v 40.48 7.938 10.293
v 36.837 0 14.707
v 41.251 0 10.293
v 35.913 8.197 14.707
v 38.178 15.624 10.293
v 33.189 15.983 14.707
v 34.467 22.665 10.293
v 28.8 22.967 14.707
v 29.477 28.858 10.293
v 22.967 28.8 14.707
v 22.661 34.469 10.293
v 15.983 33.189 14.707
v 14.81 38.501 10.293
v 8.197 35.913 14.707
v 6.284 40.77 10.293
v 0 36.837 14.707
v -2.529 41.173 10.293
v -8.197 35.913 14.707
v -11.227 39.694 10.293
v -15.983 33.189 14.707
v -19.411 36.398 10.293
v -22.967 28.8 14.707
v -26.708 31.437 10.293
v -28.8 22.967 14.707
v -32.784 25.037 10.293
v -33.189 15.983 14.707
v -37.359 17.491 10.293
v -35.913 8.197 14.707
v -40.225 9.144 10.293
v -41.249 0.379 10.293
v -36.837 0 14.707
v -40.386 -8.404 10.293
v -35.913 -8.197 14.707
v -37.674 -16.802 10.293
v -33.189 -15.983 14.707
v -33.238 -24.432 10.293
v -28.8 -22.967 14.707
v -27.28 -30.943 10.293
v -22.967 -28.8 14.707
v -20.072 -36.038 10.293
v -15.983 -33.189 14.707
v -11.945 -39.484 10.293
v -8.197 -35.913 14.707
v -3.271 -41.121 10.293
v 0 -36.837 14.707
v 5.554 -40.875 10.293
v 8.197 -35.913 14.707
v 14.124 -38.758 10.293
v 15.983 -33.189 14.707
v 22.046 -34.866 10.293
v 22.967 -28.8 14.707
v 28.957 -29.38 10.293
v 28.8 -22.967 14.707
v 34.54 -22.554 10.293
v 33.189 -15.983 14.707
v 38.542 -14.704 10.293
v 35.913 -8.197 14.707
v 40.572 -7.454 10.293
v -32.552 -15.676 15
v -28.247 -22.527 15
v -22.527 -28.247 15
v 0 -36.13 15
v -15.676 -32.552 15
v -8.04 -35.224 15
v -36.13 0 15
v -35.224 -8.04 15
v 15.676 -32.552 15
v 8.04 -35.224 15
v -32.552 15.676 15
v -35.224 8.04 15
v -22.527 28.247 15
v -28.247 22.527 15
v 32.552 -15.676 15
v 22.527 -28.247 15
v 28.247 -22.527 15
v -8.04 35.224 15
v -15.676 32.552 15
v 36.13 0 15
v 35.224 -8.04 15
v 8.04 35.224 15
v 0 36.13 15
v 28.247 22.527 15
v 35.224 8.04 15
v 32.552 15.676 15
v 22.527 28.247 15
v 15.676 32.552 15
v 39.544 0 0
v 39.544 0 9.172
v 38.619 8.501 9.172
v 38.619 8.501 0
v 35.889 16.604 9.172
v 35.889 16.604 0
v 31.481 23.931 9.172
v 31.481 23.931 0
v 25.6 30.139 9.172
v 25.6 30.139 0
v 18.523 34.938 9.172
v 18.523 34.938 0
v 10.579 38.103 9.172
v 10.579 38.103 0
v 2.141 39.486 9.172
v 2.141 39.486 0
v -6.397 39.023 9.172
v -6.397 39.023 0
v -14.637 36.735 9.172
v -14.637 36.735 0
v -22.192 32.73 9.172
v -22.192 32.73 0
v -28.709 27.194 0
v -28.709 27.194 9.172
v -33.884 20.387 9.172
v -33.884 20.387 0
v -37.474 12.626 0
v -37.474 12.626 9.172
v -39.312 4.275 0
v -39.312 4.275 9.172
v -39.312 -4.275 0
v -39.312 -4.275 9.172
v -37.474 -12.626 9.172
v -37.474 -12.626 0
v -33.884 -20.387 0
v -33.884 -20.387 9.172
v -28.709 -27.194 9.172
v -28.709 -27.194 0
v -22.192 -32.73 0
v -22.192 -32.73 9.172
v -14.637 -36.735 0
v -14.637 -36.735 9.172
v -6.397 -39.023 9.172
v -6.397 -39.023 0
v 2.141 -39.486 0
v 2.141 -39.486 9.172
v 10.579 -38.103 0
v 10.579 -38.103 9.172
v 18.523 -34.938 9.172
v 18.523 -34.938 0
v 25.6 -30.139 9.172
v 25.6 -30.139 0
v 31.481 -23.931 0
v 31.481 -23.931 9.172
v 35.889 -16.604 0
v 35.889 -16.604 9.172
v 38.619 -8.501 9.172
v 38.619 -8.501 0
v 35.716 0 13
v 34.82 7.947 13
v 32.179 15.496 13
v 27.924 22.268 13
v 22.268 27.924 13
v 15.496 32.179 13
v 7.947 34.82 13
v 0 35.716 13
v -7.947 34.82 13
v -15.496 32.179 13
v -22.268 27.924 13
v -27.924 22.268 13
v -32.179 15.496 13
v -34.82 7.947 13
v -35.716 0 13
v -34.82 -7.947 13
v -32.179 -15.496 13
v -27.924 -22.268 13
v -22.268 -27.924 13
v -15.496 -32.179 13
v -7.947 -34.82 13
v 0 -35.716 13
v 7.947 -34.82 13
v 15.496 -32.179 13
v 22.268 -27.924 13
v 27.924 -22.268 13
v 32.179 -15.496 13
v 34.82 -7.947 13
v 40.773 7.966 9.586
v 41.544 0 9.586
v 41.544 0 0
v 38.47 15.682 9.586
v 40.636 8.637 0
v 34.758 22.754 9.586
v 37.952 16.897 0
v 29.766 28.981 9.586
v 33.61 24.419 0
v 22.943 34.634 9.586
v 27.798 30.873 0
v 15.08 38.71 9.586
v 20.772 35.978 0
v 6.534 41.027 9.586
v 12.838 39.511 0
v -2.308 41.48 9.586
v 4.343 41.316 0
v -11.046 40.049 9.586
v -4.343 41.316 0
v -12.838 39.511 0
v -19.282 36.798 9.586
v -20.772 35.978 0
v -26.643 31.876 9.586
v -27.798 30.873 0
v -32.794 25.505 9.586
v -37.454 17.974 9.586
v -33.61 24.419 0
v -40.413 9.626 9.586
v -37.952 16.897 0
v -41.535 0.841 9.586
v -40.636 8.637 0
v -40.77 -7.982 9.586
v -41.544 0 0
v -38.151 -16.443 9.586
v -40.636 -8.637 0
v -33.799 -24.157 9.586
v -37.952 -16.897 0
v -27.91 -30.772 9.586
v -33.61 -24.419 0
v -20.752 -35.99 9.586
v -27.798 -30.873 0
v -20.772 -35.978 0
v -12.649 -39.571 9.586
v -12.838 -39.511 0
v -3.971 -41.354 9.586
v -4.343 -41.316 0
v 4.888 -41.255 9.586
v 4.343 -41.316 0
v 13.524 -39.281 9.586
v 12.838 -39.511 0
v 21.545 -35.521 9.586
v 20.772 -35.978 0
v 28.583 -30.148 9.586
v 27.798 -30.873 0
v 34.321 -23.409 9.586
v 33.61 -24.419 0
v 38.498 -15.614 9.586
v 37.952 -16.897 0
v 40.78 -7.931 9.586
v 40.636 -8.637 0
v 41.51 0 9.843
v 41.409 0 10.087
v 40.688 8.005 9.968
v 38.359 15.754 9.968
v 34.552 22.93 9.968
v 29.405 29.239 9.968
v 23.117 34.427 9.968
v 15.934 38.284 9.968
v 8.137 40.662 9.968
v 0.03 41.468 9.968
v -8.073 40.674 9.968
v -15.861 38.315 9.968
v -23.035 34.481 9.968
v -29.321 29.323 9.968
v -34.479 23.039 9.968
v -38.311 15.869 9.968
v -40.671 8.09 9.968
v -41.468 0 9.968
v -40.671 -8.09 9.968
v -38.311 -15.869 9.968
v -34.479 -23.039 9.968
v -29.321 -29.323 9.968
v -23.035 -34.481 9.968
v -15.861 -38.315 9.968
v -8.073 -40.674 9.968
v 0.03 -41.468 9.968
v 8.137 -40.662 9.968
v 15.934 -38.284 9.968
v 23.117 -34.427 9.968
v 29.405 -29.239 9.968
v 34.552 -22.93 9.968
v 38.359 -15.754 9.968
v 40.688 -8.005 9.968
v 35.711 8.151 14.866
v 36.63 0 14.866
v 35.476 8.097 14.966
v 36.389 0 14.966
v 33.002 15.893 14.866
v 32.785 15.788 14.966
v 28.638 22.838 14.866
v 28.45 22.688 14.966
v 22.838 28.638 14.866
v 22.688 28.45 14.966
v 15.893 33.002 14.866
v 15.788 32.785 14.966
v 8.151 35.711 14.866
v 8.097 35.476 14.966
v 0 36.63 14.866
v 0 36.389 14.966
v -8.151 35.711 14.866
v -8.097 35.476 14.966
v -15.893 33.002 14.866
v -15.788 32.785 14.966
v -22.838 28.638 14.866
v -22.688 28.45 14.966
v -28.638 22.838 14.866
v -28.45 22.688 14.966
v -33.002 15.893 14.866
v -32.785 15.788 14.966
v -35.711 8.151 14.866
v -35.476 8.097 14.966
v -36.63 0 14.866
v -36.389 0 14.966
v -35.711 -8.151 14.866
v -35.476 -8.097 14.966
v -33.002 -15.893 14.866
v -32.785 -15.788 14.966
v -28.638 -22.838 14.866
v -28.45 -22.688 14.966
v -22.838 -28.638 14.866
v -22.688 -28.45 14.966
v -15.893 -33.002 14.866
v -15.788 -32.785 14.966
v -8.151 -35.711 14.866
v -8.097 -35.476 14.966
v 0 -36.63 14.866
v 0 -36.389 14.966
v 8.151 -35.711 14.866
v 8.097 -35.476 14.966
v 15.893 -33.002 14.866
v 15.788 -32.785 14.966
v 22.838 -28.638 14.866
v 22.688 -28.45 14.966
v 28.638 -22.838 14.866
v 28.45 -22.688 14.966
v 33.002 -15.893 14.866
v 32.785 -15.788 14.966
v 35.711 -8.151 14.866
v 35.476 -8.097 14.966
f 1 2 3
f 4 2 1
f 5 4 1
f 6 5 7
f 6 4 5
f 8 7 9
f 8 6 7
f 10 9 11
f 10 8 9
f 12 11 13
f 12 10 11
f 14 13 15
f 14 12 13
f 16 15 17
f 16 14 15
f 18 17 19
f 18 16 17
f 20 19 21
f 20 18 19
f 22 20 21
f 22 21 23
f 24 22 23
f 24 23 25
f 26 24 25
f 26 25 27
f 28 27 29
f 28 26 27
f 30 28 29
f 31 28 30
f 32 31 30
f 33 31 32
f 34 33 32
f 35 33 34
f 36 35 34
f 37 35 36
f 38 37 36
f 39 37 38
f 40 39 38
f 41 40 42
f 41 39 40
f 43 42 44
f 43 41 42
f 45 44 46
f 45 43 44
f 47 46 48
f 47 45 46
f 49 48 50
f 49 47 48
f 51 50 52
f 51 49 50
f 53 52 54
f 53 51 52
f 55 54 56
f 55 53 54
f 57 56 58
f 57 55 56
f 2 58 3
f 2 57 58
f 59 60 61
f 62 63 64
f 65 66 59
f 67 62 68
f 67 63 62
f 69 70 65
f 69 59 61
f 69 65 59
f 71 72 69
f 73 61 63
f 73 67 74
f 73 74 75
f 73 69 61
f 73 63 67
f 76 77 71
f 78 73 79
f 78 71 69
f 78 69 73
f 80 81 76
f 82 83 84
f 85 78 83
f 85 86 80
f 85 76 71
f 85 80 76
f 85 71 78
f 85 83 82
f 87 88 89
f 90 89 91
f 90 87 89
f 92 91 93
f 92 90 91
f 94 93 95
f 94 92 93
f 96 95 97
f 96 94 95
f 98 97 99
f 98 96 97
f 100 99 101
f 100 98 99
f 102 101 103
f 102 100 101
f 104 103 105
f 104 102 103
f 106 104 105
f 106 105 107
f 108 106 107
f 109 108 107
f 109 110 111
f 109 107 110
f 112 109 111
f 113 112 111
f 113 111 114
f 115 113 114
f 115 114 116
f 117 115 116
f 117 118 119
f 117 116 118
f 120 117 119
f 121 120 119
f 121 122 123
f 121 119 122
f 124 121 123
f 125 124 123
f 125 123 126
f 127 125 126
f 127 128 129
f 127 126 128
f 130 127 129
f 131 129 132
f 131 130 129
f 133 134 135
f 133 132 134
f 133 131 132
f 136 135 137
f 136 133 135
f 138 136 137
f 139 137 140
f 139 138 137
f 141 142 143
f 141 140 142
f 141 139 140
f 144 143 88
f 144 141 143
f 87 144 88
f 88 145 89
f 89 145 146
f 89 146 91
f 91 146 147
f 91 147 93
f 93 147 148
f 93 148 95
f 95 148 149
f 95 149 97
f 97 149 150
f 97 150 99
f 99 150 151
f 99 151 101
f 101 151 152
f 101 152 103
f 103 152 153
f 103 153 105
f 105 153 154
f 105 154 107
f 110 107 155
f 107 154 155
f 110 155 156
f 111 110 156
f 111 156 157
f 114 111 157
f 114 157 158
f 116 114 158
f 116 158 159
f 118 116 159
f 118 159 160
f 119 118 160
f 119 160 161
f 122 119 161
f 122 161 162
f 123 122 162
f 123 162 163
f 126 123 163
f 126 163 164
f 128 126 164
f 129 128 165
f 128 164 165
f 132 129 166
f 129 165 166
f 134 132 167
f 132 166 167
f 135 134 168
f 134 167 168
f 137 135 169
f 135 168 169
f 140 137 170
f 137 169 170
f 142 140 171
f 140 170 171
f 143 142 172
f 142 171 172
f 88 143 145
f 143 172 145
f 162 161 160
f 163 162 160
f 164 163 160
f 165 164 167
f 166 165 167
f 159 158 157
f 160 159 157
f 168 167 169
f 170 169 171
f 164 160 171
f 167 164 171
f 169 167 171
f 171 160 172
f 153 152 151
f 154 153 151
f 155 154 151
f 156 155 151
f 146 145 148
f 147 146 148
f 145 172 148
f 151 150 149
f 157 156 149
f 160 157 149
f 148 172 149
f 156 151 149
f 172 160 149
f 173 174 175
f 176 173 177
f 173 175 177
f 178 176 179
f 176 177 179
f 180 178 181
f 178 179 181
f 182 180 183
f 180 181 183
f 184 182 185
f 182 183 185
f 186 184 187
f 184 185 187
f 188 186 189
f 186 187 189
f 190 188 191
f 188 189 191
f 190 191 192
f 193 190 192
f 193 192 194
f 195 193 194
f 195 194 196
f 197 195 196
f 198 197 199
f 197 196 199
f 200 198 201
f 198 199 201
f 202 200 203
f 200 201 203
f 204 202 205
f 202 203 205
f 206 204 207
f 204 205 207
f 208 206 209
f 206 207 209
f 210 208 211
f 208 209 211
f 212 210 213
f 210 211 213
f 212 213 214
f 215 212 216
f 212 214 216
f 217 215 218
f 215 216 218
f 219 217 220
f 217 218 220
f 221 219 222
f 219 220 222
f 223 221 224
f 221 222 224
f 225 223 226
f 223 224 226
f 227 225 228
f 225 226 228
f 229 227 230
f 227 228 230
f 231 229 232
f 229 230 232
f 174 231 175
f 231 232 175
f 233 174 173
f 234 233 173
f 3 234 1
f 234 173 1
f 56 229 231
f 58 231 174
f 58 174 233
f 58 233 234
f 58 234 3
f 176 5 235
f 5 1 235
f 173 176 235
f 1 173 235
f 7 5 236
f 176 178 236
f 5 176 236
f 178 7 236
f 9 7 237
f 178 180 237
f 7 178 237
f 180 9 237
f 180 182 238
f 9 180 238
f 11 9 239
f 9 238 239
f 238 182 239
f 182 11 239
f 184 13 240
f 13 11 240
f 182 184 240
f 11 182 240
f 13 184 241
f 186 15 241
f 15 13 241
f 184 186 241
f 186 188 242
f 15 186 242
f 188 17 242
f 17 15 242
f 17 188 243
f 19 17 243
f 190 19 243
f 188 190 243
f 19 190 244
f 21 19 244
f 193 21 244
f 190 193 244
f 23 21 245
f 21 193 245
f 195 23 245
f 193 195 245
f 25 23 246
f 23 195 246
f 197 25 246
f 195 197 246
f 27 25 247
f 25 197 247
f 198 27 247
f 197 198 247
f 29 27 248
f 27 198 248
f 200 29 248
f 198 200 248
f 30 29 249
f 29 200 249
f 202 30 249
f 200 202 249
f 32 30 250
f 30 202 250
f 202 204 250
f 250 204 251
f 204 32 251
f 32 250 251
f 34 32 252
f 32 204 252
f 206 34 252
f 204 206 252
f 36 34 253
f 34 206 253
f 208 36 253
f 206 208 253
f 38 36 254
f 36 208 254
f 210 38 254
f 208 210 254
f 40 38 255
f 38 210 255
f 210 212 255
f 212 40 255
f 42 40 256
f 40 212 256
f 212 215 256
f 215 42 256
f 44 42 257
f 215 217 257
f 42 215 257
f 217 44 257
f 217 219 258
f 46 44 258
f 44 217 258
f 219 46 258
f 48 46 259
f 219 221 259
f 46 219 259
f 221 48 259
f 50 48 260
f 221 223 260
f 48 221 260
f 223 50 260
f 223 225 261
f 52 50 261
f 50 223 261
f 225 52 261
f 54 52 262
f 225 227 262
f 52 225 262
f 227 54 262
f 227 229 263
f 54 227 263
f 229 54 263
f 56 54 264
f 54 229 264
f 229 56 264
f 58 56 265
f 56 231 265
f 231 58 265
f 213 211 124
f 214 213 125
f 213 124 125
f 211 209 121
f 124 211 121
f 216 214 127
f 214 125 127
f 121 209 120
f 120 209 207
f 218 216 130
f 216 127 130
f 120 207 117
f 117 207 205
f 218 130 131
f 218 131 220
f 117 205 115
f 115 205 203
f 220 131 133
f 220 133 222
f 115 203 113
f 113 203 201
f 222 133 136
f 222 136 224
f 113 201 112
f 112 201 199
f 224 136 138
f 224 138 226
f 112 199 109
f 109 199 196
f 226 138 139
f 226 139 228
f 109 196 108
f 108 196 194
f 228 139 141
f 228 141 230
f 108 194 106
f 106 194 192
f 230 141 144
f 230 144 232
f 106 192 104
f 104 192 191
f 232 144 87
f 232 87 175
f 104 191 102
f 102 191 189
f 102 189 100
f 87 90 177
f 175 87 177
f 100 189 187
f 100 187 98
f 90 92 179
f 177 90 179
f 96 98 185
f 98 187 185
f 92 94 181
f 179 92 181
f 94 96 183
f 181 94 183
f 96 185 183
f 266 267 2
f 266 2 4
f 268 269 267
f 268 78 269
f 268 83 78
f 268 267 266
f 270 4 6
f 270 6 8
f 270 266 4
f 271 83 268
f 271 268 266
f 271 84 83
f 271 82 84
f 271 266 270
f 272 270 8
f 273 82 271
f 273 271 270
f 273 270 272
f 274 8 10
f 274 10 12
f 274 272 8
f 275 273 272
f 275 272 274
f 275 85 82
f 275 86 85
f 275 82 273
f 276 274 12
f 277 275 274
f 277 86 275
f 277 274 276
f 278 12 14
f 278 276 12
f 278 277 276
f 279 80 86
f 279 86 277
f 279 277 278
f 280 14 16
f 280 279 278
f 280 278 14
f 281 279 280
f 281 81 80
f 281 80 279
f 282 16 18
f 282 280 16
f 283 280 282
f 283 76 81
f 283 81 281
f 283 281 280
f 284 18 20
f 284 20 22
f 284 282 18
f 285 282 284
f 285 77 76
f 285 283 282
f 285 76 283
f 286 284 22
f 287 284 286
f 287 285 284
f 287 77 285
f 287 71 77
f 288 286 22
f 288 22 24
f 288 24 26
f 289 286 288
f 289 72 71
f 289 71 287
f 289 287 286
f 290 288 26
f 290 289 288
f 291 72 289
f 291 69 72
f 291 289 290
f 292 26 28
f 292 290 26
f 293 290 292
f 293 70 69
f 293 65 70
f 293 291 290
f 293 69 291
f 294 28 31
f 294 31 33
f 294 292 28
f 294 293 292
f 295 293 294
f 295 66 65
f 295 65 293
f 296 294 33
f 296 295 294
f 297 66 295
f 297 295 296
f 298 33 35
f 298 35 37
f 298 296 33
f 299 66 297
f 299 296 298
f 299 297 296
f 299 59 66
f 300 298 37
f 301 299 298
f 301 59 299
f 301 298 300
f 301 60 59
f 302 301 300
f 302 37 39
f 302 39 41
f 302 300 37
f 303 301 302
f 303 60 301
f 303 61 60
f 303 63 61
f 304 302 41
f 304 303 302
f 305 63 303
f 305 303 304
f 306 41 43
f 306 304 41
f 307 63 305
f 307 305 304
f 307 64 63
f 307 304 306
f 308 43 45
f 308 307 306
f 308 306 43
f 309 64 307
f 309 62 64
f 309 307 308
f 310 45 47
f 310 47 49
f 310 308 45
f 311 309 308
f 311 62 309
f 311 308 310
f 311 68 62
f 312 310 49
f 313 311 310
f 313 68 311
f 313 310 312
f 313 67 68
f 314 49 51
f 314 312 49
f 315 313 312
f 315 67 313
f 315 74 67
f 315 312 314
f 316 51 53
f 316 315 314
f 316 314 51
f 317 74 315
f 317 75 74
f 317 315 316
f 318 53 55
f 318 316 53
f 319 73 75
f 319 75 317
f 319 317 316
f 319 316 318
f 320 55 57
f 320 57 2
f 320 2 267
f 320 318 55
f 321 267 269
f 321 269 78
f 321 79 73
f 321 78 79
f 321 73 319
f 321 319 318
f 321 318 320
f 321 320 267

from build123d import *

# Parameters (mm, degrees)
F0_R     = 41.5439468533
F1_DEPTH = 15
F2_SIZE  = 5
F3_T     = -2
F4_R     = 1


with BuildPart() as f1:
    # F0 (on Top) → F1 (new body)
    with BuildSketch(Plane.XY):
        Circle(F0_R)
    extrude(amount=F1_DEPTH)

    # F2
    f2_edges = [f1.edges().sort_by_distance(p)[0] for p in [
        (-41.543947, 0, 15),
    ]]
    chamfer(f2_edges, length=F2_SIZE)

    # F3
    f3_openings = [f1.faces().sort_by_distance(p)[0] for p in [
        (0, 0, 0),
    ]]
    offset(amount=F3_T, openings=f3_openings)

    # F4
    f4_edges = [f1.edges().sort_by_distance(p)[0] for p in [
        (39.043947, 0, 12.5),
        (-41.543947, 0, 10),
        (-36.543947, 0, 15),
    ]]
    fillet(f4_edges, radius=F4_R)


solid = f1.part
